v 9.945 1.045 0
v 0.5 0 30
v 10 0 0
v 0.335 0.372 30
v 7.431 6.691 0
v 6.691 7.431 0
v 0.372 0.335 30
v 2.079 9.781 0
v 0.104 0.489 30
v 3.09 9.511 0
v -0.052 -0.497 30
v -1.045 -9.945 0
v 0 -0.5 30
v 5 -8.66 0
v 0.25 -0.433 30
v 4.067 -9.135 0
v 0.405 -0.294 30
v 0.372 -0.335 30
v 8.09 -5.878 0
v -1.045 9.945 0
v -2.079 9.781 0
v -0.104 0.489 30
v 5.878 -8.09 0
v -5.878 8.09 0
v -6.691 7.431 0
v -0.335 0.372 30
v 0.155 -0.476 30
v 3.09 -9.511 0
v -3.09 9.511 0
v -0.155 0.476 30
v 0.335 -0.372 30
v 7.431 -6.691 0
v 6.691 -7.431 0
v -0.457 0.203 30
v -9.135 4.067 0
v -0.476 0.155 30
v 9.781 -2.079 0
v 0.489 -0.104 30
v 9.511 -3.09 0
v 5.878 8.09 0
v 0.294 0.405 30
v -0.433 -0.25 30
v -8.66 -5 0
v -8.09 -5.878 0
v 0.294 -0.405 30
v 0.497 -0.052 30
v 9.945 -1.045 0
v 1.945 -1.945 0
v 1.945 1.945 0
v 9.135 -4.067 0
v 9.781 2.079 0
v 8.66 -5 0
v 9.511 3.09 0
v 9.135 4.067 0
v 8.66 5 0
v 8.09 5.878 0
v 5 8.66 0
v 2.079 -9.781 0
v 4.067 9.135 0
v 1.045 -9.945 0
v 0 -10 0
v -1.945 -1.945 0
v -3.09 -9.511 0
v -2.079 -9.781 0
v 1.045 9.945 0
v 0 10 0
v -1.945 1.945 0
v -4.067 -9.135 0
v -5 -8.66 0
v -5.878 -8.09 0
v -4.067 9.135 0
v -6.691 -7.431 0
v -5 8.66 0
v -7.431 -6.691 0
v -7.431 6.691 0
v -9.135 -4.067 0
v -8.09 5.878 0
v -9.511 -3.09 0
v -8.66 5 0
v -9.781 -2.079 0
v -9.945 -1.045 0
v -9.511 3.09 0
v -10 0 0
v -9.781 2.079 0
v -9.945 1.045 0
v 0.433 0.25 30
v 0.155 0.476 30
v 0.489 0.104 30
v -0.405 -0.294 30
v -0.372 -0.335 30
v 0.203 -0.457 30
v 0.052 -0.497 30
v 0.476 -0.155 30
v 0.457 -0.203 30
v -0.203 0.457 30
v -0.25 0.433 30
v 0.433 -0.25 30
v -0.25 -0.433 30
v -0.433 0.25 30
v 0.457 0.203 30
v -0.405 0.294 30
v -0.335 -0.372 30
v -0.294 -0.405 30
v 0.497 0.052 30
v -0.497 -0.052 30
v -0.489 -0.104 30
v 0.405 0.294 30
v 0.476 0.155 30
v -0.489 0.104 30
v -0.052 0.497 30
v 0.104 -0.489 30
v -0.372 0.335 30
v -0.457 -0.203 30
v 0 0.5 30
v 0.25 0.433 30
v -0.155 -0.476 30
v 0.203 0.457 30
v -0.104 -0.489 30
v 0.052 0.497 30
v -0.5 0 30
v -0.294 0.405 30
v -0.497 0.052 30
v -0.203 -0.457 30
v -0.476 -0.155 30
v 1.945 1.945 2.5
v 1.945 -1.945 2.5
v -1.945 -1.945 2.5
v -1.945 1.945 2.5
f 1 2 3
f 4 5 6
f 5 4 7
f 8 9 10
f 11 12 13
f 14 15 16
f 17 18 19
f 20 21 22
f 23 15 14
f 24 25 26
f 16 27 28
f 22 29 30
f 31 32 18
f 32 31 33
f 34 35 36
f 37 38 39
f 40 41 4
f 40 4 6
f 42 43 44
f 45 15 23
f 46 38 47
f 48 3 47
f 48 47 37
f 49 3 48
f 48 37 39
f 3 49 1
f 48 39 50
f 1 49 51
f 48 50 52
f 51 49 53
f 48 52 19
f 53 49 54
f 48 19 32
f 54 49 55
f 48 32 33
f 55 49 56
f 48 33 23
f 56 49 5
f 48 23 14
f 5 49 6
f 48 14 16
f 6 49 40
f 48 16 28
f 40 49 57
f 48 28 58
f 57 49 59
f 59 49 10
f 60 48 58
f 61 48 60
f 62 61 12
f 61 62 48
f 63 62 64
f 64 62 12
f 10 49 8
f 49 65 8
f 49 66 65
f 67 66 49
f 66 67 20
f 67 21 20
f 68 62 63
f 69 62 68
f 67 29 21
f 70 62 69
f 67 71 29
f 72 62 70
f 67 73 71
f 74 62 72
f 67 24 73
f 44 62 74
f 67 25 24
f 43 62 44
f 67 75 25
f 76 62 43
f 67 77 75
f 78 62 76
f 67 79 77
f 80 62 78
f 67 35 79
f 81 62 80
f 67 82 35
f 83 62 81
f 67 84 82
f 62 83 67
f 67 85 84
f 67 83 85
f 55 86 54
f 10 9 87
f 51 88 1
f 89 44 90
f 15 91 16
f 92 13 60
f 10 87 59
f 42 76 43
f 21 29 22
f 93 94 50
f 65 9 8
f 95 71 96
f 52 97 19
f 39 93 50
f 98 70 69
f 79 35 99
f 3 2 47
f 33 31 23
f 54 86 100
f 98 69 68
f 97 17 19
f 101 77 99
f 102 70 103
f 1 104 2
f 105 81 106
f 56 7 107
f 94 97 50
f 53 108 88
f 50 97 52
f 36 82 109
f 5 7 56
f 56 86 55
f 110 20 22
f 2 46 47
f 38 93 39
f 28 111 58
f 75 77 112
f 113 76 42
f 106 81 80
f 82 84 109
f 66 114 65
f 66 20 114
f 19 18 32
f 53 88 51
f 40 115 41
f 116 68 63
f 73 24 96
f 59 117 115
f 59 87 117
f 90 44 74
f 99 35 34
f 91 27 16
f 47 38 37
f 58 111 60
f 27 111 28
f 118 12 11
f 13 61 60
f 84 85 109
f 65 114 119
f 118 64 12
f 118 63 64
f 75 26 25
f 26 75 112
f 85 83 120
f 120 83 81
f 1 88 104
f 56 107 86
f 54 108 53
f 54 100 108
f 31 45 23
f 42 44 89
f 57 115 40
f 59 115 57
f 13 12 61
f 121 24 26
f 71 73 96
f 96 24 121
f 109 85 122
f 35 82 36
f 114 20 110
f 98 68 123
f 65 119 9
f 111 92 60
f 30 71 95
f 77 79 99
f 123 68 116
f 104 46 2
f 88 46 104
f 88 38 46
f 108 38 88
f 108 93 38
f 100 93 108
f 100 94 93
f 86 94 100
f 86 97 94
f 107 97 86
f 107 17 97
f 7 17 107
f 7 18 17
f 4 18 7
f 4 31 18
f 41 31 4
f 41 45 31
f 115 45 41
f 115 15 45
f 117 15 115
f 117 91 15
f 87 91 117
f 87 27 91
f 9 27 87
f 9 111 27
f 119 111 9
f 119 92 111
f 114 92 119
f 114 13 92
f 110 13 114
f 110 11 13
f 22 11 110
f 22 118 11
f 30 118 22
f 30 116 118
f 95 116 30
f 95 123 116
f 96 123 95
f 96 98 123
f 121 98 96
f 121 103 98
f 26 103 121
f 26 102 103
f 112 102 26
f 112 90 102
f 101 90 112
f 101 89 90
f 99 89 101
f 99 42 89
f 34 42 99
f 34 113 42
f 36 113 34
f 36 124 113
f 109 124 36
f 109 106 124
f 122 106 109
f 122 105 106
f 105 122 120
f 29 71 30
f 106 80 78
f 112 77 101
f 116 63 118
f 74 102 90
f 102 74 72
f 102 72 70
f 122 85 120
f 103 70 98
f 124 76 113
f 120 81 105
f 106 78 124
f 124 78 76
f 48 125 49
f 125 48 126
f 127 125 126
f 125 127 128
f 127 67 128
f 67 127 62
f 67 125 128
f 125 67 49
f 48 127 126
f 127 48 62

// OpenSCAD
shaft_diameter = 12;
vane_head_diameter = 20;

tail_side = 60;
tail_height = 5/sqrt(2);

module head(){
    difference(){
        {cylinder(30, r1=10, r2=0.5, $fn=60);}
        {cube([tail_height*1.1, tail_height*1.1, 5], center=true);}
    }
    }
    
 head();
